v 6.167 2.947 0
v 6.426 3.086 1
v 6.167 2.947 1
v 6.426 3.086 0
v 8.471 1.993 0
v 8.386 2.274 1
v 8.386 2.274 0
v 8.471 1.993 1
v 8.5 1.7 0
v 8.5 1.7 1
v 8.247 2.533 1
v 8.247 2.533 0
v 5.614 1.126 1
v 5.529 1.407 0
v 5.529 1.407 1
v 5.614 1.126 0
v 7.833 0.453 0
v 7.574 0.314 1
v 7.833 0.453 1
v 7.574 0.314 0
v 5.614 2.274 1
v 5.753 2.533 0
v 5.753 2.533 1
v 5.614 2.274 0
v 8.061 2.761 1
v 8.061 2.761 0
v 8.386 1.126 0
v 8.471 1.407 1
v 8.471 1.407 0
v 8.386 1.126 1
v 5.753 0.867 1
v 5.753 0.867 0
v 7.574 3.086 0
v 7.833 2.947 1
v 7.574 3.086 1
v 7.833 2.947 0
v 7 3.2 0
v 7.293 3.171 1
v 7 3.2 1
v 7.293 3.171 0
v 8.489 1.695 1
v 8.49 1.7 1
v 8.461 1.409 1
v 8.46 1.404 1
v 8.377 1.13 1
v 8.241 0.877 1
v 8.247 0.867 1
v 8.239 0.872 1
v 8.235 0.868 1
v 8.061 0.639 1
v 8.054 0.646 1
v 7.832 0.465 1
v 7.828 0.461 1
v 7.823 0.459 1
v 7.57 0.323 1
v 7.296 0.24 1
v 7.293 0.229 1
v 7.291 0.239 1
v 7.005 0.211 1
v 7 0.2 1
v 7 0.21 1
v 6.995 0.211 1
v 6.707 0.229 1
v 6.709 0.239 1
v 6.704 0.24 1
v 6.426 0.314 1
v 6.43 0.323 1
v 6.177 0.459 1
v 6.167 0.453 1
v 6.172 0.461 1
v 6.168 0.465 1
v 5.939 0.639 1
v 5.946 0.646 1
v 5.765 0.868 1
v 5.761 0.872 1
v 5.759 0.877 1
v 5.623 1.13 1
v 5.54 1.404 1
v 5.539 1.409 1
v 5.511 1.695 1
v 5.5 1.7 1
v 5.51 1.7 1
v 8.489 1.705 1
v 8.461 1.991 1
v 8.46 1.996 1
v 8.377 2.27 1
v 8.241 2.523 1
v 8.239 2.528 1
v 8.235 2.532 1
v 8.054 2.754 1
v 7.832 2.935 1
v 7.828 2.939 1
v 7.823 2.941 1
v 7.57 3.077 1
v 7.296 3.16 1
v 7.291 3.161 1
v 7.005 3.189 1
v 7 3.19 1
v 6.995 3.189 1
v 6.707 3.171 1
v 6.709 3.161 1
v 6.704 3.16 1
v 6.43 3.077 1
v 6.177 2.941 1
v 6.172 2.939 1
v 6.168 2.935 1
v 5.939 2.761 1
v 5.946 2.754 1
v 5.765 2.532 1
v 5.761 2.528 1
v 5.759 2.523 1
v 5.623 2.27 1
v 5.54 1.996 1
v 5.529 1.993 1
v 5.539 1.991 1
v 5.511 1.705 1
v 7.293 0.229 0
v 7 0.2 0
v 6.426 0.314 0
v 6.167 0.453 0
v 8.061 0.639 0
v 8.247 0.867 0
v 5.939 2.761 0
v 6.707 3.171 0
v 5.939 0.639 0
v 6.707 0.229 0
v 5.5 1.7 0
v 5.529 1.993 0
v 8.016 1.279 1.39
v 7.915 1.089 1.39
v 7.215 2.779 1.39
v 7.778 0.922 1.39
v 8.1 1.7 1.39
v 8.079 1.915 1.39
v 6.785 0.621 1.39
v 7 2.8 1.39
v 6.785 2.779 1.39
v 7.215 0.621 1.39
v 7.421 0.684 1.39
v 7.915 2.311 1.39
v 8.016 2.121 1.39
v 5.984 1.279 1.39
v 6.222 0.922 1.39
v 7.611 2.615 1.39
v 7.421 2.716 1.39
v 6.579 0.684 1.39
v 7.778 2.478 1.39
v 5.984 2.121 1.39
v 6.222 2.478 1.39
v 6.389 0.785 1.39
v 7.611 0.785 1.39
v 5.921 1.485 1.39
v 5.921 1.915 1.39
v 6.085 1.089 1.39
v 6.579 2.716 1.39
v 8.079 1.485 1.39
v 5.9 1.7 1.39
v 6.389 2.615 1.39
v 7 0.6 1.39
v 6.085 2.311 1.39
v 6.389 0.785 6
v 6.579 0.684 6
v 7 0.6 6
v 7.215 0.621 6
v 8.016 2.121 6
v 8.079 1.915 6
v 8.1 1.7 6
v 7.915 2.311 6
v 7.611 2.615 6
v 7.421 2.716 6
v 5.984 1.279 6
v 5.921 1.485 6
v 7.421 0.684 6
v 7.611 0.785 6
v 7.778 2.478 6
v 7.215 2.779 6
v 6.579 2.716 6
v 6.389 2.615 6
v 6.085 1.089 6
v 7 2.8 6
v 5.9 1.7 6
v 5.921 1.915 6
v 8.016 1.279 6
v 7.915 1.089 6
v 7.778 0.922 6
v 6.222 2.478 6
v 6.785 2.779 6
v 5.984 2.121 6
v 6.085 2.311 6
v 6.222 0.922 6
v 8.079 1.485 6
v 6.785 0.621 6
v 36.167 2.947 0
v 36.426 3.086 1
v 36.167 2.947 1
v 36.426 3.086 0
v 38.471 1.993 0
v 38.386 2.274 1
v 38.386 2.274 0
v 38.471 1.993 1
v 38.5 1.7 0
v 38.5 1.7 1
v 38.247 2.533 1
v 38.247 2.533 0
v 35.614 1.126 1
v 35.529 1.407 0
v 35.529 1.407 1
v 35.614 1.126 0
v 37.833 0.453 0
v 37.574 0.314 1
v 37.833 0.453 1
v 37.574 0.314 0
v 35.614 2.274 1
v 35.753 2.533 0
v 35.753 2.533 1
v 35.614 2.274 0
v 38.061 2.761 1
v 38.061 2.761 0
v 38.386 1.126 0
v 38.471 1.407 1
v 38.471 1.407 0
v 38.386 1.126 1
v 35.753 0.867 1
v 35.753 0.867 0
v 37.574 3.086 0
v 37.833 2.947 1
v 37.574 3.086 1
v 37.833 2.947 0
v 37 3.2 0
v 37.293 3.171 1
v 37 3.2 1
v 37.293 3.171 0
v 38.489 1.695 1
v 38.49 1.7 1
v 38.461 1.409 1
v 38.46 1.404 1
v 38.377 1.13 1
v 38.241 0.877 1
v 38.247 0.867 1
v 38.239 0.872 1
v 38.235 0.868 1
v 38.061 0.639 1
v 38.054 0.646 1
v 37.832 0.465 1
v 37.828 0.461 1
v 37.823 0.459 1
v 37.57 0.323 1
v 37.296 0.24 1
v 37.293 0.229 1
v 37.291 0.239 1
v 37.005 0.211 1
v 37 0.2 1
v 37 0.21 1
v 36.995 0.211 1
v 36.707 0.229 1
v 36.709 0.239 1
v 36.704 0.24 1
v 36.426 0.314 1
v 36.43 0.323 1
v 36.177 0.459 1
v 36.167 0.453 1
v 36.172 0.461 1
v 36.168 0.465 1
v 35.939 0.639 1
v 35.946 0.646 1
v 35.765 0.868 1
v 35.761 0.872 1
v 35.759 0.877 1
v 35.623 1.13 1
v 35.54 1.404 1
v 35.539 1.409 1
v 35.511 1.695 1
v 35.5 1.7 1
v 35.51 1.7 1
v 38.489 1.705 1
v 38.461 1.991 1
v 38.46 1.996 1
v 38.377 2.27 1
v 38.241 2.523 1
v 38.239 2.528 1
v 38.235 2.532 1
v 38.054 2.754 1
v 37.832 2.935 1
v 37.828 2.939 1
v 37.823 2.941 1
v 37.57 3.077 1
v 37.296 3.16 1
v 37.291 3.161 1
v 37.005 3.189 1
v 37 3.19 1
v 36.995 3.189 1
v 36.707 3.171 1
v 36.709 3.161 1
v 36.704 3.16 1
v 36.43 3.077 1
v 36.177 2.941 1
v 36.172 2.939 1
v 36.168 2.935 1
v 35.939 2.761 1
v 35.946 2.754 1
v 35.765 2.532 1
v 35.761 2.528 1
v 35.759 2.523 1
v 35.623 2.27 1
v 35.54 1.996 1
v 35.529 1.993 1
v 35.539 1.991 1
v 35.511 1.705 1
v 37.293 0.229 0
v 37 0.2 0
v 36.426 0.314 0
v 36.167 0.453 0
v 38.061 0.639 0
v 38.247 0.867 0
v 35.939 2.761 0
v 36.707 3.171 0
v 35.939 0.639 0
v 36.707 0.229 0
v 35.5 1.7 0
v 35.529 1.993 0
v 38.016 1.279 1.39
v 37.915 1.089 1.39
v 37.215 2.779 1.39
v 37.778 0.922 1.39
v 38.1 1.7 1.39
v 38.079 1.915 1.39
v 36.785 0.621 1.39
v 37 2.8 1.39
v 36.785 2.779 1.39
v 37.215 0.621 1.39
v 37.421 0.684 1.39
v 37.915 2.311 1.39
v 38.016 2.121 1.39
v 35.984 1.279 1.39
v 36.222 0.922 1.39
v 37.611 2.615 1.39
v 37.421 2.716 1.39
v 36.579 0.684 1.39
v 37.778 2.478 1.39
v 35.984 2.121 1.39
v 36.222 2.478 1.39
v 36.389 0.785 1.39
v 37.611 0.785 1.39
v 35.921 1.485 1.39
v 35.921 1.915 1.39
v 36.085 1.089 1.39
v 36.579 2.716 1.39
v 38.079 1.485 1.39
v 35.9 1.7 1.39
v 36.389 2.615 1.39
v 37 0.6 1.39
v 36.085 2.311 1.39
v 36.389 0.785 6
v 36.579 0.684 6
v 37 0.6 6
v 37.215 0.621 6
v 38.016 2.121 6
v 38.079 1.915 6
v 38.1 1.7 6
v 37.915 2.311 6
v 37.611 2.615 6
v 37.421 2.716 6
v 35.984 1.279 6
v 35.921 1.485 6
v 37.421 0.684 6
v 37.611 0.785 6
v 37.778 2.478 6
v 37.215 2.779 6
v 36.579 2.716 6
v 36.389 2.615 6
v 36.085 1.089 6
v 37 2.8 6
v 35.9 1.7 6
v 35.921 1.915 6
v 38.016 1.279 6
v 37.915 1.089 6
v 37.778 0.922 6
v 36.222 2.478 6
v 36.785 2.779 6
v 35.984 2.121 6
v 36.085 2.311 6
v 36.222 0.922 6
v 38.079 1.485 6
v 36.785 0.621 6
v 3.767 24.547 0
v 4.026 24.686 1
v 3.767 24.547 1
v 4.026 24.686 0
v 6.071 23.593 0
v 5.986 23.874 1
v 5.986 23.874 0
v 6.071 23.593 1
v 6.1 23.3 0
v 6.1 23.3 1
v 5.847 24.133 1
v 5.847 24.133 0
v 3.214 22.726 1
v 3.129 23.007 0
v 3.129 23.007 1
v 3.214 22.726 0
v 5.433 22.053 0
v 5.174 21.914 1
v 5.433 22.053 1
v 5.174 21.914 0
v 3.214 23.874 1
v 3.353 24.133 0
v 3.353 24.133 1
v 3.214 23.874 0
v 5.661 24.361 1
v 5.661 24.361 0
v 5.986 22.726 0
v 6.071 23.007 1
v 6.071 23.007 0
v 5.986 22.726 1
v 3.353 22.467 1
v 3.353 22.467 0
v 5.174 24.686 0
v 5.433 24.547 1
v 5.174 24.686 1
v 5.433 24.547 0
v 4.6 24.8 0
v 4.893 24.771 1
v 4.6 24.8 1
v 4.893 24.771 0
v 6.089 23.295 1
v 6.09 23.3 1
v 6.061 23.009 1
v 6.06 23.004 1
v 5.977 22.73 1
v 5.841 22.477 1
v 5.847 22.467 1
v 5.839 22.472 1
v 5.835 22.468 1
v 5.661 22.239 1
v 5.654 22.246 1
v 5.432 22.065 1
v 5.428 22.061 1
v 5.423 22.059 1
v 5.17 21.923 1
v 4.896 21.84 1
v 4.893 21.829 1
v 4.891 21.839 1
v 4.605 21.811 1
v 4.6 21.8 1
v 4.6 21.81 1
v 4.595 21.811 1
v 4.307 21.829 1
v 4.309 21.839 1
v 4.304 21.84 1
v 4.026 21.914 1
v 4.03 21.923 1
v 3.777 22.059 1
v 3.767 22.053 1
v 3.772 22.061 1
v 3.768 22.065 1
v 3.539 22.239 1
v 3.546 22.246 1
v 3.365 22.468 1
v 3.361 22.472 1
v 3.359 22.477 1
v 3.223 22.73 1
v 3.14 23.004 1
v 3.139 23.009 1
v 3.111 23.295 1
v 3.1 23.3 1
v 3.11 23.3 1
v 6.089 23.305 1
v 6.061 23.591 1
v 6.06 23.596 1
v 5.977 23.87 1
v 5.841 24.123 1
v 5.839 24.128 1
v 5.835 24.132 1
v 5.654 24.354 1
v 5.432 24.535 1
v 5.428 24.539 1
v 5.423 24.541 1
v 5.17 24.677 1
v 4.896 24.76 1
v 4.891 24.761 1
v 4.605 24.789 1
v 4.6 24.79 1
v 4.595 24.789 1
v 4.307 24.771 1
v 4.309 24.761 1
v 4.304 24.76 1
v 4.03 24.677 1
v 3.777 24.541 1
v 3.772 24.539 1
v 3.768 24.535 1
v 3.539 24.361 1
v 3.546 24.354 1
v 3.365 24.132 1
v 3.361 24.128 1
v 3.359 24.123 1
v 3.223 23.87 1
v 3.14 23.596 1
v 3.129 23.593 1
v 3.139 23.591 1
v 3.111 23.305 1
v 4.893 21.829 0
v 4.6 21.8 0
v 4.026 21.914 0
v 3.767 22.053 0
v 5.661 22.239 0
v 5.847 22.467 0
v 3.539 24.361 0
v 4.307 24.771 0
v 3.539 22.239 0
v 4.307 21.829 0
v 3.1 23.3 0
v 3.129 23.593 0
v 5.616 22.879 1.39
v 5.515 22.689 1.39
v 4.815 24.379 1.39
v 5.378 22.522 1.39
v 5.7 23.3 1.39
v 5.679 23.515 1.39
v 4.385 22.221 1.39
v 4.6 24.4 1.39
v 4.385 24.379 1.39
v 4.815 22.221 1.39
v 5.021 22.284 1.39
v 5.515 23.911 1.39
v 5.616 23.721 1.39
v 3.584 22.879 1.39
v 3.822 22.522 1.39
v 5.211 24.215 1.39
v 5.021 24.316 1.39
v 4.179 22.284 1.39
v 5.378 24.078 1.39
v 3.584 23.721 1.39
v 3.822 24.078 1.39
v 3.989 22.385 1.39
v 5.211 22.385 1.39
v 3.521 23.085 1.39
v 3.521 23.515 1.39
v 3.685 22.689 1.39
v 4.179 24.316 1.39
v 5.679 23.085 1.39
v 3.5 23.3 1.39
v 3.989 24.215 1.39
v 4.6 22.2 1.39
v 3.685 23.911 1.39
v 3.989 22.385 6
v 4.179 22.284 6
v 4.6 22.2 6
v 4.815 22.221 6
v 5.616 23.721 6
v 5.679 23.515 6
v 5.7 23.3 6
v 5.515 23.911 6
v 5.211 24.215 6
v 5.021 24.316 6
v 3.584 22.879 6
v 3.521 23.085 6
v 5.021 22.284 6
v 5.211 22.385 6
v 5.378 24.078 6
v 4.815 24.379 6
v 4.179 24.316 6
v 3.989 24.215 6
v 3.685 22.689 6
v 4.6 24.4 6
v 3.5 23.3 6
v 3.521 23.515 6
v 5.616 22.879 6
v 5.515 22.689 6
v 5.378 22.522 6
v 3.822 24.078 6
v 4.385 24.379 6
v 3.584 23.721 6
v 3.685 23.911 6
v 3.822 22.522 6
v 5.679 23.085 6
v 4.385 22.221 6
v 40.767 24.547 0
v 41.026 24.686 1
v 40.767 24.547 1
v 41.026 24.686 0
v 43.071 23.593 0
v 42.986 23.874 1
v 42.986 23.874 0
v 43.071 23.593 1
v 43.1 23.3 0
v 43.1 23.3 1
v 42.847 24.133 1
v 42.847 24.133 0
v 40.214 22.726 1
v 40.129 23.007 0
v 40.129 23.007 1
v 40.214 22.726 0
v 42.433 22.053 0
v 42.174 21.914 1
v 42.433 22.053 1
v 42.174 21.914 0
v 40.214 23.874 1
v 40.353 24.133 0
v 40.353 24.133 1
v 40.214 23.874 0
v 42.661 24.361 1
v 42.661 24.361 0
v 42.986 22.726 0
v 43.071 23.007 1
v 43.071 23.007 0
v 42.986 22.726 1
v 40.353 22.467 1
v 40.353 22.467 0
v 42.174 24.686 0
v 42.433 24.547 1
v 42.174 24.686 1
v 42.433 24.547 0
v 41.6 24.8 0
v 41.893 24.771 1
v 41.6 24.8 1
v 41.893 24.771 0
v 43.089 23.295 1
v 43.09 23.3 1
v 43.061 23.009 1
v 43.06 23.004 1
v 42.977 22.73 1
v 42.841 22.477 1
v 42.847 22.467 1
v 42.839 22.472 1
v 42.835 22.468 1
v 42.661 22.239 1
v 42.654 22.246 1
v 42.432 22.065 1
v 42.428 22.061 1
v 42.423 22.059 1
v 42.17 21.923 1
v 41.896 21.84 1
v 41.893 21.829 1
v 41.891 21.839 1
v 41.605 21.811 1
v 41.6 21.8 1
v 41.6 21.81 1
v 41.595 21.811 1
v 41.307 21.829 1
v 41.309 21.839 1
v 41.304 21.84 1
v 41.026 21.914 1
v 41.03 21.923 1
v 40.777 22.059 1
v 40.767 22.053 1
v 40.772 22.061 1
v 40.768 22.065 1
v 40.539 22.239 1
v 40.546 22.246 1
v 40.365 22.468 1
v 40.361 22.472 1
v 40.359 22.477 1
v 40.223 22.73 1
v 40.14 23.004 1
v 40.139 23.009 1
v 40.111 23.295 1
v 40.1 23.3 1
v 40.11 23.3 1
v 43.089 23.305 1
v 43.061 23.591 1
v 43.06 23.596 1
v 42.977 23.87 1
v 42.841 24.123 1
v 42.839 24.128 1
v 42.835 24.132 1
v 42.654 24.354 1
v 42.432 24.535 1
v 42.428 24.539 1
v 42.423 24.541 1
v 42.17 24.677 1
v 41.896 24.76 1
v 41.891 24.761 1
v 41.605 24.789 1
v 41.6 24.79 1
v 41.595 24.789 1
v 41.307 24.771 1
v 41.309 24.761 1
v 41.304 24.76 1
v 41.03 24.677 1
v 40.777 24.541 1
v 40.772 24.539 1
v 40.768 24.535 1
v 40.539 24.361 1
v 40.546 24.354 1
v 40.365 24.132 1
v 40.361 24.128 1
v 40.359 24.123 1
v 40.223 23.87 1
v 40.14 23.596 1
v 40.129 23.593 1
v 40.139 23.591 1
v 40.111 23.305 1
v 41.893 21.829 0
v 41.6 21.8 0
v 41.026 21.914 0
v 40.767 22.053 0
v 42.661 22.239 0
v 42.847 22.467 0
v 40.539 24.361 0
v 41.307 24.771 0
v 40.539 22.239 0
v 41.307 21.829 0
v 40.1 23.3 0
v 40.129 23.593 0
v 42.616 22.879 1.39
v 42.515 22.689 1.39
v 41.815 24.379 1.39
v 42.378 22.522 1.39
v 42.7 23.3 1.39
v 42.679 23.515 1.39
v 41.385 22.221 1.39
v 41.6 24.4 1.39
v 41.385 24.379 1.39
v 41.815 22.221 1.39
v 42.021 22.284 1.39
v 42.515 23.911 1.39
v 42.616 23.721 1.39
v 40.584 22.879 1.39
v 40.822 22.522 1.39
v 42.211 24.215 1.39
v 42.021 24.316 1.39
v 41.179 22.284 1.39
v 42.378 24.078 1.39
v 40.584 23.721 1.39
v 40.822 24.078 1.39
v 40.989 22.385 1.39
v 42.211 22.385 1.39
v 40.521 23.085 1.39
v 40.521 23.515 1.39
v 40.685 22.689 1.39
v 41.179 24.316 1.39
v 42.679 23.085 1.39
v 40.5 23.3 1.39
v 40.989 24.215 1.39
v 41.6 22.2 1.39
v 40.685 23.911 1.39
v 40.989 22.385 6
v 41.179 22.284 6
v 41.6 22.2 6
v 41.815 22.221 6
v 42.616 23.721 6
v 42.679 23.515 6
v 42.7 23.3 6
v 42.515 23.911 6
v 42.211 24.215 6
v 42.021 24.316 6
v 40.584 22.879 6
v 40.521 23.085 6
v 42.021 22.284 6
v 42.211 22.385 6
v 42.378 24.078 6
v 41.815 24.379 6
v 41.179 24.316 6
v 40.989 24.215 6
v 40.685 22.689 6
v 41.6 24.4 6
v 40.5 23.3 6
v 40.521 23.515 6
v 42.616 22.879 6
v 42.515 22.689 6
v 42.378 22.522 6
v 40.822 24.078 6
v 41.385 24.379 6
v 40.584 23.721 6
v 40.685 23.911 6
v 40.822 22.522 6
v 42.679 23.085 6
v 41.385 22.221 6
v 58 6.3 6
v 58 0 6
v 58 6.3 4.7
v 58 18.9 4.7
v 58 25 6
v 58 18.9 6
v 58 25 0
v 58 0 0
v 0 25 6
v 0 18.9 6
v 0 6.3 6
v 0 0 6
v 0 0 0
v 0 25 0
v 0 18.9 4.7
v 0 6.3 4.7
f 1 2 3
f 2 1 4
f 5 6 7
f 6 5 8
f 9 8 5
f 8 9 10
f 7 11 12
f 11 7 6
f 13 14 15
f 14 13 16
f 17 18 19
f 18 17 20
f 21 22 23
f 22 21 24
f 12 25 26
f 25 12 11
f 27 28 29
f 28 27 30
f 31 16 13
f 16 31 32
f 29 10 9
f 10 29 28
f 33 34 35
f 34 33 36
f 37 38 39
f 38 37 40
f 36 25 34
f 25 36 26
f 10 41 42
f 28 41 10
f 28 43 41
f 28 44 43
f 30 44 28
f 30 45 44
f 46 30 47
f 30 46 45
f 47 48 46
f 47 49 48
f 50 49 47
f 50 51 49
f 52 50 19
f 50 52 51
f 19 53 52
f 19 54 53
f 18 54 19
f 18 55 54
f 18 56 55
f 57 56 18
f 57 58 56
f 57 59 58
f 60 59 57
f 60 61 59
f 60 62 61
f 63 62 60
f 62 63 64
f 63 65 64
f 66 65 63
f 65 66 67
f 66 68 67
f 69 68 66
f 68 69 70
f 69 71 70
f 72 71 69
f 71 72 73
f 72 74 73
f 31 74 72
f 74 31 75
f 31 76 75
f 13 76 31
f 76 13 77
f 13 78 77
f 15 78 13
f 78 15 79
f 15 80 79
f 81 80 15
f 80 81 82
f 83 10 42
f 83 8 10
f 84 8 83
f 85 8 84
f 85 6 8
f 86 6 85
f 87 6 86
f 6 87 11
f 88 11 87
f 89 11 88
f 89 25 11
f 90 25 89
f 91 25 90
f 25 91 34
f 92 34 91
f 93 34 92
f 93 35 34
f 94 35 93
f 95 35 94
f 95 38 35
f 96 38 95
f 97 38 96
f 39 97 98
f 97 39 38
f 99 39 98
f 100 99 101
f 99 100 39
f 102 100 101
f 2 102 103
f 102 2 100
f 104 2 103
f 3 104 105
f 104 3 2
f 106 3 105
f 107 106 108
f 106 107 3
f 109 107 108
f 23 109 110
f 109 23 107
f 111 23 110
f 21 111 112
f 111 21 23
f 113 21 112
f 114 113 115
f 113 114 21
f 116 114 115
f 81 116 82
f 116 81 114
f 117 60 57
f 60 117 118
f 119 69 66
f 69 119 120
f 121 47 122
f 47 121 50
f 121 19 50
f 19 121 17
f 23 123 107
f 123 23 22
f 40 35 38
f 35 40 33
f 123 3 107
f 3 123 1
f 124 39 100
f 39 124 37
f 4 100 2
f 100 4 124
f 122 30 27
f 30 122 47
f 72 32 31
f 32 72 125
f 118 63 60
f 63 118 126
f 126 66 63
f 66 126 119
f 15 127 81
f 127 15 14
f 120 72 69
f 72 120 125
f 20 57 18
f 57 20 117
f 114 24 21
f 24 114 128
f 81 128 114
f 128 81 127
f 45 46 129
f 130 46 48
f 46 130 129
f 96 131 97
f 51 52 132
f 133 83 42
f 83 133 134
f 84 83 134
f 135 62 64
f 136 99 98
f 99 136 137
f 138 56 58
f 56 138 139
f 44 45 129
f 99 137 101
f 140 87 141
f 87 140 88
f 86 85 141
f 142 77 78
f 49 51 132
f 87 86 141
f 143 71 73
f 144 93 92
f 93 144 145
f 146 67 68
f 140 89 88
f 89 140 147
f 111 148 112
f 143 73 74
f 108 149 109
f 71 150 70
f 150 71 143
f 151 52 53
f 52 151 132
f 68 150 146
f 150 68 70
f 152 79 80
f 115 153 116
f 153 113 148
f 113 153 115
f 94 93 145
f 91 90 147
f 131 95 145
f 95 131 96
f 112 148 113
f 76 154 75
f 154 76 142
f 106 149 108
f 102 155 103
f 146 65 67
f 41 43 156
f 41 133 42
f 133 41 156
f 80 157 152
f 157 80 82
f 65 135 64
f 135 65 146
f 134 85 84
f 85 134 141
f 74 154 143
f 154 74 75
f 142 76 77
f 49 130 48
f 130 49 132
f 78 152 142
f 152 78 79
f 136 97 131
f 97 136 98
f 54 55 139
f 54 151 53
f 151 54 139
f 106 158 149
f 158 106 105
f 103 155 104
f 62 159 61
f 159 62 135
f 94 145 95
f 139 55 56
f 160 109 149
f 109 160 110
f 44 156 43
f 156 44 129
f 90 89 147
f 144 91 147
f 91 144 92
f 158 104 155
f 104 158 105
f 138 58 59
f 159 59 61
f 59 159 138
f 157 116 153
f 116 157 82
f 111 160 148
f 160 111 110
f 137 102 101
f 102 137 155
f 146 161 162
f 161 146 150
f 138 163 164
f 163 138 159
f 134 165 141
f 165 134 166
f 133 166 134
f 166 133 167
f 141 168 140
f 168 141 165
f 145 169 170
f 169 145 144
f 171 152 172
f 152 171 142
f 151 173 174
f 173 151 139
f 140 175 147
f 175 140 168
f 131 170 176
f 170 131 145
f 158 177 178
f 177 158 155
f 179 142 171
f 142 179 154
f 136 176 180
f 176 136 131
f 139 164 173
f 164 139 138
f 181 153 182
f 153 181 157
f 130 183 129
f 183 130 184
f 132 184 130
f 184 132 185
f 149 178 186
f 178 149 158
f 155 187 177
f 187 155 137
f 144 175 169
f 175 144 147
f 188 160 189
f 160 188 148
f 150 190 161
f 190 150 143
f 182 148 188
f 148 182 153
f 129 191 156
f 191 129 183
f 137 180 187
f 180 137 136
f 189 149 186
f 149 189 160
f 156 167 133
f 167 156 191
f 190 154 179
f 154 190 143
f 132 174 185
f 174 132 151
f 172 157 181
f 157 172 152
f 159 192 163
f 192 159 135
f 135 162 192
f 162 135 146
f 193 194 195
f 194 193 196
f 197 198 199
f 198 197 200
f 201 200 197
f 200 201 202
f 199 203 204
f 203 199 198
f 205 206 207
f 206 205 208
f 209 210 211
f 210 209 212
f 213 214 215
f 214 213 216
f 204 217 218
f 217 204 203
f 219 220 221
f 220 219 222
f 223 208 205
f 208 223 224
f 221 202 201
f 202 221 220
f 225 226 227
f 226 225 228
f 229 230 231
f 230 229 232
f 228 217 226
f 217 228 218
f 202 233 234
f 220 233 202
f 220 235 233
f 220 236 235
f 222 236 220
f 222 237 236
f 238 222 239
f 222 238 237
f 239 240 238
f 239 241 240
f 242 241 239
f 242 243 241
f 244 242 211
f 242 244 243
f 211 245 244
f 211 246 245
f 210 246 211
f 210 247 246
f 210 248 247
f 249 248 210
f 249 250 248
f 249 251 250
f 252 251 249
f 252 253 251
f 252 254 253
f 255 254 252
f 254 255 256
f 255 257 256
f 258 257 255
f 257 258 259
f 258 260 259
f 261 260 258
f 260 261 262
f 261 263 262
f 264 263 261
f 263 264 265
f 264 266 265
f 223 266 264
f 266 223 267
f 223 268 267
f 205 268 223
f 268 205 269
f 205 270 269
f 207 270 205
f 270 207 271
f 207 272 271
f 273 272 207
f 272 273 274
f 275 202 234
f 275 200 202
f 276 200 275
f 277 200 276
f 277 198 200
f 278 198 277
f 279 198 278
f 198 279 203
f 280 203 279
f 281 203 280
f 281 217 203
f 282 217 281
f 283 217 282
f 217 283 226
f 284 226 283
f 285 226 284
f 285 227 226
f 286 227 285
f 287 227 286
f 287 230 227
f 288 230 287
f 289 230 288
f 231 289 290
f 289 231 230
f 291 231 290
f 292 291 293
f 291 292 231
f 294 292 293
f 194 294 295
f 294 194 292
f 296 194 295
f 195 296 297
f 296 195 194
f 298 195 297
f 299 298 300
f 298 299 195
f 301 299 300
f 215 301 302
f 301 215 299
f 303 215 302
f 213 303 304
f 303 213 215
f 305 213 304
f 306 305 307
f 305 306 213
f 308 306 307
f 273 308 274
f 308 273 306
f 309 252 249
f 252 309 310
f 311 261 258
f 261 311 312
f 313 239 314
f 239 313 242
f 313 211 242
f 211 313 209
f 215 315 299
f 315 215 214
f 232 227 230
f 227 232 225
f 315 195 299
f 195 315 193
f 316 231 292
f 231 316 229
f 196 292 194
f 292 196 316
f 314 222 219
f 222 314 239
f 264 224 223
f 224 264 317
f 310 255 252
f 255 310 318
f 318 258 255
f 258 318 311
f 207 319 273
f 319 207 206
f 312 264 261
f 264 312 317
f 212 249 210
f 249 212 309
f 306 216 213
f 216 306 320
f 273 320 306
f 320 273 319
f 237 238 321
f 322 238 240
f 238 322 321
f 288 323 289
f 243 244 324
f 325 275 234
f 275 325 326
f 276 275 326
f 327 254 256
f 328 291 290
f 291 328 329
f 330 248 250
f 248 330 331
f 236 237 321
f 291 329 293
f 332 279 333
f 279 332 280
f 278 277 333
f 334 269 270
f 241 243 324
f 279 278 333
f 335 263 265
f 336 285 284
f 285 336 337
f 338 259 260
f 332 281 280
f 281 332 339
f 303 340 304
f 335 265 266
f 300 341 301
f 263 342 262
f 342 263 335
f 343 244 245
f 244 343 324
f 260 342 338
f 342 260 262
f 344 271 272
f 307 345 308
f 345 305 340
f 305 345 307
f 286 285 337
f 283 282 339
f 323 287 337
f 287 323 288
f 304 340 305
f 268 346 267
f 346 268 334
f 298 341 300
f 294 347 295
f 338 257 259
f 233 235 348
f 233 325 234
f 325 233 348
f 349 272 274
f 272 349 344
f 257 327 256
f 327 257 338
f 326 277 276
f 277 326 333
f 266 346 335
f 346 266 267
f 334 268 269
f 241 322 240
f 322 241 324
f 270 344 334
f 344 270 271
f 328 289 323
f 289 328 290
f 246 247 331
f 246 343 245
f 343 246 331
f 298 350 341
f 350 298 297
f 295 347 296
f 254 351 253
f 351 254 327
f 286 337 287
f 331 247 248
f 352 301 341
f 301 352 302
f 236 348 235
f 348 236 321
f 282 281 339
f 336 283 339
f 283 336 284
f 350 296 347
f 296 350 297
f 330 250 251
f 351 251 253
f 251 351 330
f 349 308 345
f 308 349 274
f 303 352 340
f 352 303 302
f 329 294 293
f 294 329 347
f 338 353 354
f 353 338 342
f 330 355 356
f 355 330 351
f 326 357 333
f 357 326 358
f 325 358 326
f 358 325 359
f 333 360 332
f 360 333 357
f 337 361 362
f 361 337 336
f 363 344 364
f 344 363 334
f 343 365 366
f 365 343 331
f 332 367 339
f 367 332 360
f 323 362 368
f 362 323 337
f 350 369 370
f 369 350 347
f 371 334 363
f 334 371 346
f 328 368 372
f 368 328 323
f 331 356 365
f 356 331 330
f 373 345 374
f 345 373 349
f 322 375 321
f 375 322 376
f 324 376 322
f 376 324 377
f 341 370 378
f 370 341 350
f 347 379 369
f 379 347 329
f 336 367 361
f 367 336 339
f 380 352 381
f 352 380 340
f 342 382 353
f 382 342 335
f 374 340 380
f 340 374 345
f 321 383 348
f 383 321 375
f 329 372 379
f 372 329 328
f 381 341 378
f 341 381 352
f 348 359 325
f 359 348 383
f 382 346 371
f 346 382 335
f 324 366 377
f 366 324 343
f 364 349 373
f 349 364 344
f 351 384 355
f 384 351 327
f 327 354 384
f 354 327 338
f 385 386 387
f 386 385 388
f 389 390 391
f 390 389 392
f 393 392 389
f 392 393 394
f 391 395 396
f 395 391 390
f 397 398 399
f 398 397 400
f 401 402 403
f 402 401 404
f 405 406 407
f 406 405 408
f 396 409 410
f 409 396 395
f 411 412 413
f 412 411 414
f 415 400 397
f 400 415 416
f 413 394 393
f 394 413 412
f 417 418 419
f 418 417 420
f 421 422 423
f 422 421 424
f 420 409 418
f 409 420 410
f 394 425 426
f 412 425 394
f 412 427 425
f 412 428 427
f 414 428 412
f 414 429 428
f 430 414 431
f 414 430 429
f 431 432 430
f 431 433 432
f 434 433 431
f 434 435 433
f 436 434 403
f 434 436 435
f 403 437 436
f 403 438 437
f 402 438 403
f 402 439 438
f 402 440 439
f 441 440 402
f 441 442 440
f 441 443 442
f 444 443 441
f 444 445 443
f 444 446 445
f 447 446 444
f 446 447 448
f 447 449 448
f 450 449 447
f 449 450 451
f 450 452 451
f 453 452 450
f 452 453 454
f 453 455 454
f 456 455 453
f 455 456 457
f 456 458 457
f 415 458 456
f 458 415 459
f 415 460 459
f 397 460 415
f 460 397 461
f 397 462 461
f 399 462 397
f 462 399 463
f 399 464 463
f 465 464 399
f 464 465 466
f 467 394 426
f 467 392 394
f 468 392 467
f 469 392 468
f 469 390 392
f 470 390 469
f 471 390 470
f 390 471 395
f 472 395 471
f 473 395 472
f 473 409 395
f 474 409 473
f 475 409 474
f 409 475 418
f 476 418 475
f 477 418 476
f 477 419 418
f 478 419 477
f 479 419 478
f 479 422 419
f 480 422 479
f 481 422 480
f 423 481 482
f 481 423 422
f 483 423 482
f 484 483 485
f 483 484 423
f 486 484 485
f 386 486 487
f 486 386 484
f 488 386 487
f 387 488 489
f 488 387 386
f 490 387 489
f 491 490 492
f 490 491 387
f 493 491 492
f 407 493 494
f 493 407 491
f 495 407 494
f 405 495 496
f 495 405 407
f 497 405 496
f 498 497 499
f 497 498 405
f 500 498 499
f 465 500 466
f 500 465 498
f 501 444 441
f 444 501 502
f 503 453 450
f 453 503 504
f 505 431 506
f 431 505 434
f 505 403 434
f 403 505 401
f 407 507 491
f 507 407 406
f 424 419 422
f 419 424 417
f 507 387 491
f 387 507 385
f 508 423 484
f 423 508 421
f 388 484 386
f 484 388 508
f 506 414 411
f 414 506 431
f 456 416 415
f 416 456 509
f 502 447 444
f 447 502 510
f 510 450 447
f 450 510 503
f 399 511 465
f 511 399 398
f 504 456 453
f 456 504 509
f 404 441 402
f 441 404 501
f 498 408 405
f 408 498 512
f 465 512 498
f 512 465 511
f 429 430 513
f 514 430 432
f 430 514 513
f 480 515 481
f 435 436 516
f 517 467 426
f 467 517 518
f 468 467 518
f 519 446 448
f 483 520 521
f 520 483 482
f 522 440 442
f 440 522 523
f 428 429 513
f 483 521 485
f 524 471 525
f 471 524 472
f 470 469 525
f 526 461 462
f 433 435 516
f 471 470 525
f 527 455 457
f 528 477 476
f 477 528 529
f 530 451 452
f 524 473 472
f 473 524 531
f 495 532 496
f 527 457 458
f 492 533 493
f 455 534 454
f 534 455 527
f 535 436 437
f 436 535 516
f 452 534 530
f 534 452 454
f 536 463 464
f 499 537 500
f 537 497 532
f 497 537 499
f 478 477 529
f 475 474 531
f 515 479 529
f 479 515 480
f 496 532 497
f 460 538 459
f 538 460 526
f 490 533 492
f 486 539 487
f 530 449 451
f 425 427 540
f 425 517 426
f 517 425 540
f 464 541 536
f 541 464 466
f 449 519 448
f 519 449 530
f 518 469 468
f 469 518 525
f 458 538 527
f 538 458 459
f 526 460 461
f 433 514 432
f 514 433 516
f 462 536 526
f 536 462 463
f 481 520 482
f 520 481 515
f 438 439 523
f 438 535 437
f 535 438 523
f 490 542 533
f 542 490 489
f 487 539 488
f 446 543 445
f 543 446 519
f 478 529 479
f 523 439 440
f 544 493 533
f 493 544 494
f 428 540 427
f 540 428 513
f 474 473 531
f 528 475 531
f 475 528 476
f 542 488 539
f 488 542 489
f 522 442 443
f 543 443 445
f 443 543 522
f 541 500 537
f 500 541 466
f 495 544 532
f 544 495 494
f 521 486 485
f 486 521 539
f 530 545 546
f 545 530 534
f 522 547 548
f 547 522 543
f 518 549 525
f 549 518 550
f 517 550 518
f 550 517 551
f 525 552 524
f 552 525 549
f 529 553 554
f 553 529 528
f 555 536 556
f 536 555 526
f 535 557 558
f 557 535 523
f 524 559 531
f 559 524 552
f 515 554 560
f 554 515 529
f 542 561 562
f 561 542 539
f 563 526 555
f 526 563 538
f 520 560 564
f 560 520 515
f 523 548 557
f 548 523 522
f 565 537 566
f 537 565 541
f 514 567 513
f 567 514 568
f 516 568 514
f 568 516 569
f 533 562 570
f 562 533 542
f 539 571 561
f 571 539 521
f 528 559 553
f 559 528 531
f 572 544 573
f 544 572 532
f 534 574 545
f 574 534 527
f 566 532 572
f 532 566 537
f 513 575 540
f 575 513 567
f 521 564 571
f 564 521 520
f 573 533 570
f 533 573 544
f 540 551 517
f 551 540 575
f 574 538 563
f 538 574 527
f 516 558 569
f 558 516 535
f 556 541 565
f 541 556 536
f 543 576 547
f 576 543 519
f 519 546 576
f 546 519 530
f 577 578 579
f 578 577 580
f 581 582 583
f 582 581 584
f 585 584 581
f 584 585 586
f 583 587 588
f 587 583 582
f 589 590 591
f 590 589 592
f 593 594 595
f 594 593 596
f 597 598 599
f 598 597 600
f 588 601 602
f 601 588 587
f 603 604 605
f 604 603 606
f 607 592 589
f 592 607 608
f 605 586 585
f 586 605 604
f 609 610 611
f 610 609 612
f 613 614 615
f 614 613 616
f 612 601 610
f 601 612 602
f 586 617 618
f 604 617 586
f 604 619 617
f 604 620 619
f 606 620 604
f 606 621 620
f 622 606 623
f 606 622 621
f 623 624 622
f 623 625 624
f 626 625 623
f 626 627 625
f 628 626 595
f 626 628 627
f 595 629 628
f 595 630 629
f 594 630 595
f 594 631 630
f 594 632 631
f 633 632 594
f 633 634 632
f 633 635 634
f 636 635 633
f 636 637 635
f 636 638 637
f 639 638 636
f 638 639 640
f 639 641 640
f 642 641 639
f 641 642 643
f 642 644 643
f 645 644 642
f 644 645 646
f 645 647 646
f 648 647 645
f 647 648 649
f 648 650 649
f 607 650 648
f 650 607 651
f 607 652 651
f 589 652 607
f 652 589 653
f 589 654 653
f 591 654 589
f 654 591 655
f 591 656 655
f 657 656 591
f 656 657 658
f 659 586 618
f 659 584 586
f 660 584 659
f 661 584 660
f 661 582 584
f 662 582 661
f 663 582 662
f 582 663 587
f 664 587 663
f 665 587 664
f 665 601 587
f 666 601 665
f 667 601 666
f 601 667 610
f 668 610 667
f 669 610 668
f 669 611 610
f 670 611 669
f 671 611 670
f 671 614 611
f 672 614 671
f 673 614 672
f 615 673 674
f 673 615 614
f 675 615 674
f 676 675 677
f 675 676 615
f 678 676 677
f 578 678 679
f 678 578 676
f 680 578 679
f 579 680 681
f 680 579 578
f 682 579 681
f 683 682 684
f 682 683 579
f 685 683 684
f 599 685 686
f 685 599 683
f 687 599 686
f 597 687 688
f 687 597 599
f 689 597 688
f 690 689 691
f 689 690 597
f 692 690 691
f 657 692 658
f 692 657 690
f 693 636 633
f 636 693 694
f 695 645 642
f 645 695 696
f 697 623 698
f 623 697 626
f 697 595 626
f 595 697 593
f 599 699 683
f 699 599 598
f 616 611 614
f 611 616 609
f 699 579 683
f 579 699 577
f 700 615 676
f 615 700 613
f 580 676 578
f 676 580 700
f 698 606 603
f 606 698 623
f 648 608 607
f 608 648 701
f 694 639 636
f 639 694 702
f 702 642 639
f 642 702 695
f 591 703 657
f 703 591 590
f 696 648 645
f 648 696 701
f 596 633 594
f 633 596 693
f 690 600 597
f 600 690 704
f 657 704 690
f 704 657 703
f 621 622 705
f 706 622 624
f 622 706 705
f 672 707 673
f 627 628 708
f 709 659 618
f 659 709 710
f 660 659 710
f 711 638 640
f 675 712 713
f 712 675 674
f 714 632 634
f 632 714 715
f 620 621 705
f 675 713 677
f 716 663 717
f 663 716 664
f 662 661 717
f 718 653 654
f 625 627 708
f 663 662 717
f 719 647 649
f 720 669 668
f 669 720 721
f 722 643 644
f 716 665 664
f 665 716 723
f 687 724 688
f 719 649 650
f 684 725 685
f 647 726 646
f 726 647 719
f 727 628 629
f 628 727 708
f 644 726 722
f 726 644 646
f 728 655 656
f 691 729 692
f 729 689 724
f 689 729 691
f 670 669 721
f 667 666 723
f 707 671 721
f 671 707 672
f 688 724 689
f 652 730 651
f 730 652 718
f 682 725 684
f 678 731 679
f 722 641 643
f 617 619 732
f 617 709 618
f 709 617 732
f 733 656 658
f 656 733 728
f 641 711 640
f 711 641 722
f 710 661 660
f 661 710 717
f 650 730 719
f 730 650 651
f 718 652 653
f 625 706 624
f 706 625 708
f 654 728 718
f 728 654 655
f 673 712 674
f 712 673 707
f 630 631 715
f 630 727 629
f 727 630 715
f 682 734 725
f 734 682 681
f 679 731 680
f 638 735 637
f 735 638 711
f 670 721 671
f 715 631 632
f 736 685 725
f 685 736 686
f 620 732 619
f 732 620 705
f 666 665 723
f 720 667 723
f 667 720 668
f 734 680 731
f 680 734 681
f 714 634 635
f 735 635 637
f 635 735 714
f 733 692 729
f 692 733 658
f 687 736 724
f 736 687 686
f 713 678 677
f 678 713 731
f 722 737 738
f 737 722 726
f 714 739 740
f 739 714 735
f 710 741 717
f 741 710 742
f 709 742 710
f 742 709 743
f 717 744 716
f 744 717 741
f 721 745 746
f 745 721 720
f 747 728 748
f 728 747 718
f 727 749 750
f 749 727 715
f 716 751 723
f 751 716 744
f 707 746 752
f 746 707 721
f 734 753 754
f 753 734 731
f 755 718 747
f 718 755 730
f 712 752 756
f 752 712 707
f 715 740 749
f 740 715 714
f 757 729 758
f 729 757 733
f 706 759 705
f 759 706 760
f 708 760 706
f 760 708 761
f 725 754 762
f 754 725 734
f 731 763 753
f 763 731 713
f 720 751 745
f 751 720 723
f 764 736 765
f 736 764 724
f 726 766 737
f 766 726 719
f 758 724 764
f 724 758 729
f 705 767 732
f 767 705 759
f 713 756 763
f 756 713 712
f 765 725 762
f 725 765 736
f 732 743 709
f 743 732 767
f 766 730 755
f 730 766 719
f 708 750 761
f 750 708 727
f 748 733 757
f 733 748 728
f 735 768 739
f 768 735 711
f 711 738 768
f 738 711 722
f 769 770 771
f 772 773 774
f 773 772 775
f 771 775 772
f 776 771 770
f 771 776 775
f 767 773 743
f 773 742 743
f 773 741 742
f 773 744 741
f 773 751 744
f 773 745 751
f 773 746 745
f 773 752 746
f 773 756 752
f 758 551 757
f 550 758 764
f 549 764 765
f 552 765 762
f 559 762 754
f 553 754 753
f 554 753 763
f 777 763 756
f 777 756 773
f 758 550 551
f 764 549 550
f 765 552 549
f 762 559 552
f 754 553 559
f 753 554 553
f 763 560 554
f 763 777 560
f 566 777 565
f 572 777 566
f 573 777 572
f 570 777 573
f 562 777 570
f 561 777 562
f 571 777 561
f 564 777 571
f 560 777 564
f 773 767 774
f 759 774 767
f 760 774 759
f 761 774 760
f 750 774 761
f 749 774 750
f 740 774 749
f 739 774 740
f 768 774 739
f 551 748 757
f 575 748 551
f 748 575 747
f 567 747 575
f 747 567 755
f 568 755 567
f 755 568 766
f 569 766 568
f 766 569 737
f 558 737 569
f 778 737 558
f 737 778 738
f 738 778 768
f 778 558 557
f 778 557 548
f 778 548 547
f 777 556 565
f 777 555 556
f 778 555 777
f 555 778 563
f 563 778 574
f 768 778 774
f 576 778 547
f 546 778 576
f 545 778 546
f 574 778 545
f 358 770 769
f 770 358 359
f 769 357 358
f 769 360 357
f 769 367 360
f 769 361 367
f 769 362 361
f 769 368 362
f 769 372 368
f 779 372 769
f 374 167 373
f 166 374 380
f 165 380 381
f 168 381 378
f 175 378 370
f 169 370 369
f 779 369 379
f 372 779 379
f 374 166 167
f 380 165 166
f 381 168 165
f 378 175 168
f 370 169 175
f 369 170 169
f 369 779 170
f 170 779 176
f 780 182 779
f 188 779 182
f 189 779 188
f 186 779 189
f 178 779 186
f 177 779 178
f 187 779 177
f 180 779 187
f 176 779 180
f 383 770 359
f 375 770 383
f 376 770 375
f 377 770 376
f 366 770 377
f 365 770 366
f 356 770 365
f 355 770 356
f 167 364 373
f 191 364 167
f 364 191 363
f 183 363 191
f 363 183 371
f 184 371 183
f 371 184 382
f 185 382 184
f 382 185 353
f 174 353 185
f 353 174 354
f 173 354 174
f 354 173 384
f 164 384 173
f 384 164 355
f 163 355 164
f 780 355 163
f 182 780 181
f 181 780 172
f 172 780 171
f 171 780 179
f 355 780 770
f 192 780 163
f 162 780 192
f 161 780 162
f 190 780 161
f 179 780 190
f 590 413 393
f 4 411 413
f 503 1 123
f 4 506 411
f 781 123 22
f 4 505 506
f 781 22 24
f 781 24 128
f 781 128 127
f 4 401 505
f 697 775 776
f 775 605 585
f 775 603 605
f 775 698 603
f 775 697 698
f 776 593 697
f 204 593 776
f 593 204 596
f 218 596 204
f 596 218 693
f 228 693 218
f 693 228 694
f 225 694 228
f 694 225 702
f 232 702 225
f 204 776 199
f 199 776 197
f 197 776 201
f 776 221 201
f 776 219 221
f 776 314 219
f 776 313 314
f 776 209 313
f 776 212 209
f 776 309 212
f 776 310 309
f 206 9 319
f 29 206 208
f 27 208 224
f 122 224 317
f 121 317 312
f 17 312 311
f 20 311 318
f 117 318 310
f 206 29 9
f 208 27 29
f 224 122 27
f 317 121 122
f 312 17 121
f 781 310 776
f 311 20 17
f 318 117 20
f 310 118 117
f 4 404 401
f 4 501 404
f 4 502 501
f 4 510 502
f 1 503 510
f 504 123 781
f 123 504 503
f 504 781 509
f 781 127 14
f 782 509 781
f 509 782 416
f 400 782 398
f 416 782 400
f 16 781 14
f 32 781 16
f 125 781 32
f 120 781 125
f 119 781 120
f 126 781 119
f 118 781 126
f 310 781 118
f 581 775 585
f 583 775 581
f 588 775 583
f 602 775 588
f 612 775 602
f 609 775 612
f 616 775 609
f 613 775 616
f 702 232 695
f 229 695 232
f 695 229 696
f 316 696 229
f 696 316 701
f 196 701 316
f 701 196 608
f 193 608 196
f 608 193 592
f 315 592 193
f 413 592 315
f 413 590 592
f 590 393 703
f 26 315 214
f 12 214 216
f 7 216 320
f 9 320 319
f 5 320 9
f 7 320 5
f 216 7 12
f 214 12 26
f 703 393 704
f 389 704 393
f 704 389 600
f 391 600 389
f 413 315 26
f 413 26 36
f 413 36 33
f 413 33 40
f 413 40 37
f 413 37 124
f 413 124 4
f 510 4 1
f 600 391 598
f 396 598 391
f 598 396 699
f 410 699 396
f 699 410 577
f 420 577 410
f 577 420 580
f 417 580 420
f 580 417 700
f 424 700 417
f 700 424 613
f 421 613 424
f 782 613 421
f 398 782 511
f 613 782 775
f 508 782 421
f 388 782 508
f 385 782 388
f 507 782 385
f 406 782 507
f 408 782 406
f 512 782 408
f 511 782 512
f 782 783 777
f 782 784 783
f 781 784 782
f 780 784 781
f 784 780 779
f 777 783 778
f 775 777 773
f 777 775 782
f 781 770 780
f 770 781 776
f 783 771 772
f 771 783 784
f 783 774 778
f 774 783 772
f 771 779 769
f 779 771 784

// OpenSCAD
module screwhole()
translate([0,0,-1]){cylinder(r=3/2,h=2,$fn=32);translate([0,0,1.99])cylinder(r1=3/2,r2=2.2/2,h=(3-2.2)/2,$fn=32);cylinder(r=2.2/2,h=10,$fn=32);}
difference(){cube([58,25,6]);
translate([-0.5,6.6-0.3,6-1.3])cube([59,12.6,6]);
translate([58-51.0,1.7,0])screwhole();
translate([58-21.0,1.7,0])screwhole();
translate([58-53.4,25-1.7,0])screwhole();
translate([58-16.4,25-1.7,0])screwhole();}
